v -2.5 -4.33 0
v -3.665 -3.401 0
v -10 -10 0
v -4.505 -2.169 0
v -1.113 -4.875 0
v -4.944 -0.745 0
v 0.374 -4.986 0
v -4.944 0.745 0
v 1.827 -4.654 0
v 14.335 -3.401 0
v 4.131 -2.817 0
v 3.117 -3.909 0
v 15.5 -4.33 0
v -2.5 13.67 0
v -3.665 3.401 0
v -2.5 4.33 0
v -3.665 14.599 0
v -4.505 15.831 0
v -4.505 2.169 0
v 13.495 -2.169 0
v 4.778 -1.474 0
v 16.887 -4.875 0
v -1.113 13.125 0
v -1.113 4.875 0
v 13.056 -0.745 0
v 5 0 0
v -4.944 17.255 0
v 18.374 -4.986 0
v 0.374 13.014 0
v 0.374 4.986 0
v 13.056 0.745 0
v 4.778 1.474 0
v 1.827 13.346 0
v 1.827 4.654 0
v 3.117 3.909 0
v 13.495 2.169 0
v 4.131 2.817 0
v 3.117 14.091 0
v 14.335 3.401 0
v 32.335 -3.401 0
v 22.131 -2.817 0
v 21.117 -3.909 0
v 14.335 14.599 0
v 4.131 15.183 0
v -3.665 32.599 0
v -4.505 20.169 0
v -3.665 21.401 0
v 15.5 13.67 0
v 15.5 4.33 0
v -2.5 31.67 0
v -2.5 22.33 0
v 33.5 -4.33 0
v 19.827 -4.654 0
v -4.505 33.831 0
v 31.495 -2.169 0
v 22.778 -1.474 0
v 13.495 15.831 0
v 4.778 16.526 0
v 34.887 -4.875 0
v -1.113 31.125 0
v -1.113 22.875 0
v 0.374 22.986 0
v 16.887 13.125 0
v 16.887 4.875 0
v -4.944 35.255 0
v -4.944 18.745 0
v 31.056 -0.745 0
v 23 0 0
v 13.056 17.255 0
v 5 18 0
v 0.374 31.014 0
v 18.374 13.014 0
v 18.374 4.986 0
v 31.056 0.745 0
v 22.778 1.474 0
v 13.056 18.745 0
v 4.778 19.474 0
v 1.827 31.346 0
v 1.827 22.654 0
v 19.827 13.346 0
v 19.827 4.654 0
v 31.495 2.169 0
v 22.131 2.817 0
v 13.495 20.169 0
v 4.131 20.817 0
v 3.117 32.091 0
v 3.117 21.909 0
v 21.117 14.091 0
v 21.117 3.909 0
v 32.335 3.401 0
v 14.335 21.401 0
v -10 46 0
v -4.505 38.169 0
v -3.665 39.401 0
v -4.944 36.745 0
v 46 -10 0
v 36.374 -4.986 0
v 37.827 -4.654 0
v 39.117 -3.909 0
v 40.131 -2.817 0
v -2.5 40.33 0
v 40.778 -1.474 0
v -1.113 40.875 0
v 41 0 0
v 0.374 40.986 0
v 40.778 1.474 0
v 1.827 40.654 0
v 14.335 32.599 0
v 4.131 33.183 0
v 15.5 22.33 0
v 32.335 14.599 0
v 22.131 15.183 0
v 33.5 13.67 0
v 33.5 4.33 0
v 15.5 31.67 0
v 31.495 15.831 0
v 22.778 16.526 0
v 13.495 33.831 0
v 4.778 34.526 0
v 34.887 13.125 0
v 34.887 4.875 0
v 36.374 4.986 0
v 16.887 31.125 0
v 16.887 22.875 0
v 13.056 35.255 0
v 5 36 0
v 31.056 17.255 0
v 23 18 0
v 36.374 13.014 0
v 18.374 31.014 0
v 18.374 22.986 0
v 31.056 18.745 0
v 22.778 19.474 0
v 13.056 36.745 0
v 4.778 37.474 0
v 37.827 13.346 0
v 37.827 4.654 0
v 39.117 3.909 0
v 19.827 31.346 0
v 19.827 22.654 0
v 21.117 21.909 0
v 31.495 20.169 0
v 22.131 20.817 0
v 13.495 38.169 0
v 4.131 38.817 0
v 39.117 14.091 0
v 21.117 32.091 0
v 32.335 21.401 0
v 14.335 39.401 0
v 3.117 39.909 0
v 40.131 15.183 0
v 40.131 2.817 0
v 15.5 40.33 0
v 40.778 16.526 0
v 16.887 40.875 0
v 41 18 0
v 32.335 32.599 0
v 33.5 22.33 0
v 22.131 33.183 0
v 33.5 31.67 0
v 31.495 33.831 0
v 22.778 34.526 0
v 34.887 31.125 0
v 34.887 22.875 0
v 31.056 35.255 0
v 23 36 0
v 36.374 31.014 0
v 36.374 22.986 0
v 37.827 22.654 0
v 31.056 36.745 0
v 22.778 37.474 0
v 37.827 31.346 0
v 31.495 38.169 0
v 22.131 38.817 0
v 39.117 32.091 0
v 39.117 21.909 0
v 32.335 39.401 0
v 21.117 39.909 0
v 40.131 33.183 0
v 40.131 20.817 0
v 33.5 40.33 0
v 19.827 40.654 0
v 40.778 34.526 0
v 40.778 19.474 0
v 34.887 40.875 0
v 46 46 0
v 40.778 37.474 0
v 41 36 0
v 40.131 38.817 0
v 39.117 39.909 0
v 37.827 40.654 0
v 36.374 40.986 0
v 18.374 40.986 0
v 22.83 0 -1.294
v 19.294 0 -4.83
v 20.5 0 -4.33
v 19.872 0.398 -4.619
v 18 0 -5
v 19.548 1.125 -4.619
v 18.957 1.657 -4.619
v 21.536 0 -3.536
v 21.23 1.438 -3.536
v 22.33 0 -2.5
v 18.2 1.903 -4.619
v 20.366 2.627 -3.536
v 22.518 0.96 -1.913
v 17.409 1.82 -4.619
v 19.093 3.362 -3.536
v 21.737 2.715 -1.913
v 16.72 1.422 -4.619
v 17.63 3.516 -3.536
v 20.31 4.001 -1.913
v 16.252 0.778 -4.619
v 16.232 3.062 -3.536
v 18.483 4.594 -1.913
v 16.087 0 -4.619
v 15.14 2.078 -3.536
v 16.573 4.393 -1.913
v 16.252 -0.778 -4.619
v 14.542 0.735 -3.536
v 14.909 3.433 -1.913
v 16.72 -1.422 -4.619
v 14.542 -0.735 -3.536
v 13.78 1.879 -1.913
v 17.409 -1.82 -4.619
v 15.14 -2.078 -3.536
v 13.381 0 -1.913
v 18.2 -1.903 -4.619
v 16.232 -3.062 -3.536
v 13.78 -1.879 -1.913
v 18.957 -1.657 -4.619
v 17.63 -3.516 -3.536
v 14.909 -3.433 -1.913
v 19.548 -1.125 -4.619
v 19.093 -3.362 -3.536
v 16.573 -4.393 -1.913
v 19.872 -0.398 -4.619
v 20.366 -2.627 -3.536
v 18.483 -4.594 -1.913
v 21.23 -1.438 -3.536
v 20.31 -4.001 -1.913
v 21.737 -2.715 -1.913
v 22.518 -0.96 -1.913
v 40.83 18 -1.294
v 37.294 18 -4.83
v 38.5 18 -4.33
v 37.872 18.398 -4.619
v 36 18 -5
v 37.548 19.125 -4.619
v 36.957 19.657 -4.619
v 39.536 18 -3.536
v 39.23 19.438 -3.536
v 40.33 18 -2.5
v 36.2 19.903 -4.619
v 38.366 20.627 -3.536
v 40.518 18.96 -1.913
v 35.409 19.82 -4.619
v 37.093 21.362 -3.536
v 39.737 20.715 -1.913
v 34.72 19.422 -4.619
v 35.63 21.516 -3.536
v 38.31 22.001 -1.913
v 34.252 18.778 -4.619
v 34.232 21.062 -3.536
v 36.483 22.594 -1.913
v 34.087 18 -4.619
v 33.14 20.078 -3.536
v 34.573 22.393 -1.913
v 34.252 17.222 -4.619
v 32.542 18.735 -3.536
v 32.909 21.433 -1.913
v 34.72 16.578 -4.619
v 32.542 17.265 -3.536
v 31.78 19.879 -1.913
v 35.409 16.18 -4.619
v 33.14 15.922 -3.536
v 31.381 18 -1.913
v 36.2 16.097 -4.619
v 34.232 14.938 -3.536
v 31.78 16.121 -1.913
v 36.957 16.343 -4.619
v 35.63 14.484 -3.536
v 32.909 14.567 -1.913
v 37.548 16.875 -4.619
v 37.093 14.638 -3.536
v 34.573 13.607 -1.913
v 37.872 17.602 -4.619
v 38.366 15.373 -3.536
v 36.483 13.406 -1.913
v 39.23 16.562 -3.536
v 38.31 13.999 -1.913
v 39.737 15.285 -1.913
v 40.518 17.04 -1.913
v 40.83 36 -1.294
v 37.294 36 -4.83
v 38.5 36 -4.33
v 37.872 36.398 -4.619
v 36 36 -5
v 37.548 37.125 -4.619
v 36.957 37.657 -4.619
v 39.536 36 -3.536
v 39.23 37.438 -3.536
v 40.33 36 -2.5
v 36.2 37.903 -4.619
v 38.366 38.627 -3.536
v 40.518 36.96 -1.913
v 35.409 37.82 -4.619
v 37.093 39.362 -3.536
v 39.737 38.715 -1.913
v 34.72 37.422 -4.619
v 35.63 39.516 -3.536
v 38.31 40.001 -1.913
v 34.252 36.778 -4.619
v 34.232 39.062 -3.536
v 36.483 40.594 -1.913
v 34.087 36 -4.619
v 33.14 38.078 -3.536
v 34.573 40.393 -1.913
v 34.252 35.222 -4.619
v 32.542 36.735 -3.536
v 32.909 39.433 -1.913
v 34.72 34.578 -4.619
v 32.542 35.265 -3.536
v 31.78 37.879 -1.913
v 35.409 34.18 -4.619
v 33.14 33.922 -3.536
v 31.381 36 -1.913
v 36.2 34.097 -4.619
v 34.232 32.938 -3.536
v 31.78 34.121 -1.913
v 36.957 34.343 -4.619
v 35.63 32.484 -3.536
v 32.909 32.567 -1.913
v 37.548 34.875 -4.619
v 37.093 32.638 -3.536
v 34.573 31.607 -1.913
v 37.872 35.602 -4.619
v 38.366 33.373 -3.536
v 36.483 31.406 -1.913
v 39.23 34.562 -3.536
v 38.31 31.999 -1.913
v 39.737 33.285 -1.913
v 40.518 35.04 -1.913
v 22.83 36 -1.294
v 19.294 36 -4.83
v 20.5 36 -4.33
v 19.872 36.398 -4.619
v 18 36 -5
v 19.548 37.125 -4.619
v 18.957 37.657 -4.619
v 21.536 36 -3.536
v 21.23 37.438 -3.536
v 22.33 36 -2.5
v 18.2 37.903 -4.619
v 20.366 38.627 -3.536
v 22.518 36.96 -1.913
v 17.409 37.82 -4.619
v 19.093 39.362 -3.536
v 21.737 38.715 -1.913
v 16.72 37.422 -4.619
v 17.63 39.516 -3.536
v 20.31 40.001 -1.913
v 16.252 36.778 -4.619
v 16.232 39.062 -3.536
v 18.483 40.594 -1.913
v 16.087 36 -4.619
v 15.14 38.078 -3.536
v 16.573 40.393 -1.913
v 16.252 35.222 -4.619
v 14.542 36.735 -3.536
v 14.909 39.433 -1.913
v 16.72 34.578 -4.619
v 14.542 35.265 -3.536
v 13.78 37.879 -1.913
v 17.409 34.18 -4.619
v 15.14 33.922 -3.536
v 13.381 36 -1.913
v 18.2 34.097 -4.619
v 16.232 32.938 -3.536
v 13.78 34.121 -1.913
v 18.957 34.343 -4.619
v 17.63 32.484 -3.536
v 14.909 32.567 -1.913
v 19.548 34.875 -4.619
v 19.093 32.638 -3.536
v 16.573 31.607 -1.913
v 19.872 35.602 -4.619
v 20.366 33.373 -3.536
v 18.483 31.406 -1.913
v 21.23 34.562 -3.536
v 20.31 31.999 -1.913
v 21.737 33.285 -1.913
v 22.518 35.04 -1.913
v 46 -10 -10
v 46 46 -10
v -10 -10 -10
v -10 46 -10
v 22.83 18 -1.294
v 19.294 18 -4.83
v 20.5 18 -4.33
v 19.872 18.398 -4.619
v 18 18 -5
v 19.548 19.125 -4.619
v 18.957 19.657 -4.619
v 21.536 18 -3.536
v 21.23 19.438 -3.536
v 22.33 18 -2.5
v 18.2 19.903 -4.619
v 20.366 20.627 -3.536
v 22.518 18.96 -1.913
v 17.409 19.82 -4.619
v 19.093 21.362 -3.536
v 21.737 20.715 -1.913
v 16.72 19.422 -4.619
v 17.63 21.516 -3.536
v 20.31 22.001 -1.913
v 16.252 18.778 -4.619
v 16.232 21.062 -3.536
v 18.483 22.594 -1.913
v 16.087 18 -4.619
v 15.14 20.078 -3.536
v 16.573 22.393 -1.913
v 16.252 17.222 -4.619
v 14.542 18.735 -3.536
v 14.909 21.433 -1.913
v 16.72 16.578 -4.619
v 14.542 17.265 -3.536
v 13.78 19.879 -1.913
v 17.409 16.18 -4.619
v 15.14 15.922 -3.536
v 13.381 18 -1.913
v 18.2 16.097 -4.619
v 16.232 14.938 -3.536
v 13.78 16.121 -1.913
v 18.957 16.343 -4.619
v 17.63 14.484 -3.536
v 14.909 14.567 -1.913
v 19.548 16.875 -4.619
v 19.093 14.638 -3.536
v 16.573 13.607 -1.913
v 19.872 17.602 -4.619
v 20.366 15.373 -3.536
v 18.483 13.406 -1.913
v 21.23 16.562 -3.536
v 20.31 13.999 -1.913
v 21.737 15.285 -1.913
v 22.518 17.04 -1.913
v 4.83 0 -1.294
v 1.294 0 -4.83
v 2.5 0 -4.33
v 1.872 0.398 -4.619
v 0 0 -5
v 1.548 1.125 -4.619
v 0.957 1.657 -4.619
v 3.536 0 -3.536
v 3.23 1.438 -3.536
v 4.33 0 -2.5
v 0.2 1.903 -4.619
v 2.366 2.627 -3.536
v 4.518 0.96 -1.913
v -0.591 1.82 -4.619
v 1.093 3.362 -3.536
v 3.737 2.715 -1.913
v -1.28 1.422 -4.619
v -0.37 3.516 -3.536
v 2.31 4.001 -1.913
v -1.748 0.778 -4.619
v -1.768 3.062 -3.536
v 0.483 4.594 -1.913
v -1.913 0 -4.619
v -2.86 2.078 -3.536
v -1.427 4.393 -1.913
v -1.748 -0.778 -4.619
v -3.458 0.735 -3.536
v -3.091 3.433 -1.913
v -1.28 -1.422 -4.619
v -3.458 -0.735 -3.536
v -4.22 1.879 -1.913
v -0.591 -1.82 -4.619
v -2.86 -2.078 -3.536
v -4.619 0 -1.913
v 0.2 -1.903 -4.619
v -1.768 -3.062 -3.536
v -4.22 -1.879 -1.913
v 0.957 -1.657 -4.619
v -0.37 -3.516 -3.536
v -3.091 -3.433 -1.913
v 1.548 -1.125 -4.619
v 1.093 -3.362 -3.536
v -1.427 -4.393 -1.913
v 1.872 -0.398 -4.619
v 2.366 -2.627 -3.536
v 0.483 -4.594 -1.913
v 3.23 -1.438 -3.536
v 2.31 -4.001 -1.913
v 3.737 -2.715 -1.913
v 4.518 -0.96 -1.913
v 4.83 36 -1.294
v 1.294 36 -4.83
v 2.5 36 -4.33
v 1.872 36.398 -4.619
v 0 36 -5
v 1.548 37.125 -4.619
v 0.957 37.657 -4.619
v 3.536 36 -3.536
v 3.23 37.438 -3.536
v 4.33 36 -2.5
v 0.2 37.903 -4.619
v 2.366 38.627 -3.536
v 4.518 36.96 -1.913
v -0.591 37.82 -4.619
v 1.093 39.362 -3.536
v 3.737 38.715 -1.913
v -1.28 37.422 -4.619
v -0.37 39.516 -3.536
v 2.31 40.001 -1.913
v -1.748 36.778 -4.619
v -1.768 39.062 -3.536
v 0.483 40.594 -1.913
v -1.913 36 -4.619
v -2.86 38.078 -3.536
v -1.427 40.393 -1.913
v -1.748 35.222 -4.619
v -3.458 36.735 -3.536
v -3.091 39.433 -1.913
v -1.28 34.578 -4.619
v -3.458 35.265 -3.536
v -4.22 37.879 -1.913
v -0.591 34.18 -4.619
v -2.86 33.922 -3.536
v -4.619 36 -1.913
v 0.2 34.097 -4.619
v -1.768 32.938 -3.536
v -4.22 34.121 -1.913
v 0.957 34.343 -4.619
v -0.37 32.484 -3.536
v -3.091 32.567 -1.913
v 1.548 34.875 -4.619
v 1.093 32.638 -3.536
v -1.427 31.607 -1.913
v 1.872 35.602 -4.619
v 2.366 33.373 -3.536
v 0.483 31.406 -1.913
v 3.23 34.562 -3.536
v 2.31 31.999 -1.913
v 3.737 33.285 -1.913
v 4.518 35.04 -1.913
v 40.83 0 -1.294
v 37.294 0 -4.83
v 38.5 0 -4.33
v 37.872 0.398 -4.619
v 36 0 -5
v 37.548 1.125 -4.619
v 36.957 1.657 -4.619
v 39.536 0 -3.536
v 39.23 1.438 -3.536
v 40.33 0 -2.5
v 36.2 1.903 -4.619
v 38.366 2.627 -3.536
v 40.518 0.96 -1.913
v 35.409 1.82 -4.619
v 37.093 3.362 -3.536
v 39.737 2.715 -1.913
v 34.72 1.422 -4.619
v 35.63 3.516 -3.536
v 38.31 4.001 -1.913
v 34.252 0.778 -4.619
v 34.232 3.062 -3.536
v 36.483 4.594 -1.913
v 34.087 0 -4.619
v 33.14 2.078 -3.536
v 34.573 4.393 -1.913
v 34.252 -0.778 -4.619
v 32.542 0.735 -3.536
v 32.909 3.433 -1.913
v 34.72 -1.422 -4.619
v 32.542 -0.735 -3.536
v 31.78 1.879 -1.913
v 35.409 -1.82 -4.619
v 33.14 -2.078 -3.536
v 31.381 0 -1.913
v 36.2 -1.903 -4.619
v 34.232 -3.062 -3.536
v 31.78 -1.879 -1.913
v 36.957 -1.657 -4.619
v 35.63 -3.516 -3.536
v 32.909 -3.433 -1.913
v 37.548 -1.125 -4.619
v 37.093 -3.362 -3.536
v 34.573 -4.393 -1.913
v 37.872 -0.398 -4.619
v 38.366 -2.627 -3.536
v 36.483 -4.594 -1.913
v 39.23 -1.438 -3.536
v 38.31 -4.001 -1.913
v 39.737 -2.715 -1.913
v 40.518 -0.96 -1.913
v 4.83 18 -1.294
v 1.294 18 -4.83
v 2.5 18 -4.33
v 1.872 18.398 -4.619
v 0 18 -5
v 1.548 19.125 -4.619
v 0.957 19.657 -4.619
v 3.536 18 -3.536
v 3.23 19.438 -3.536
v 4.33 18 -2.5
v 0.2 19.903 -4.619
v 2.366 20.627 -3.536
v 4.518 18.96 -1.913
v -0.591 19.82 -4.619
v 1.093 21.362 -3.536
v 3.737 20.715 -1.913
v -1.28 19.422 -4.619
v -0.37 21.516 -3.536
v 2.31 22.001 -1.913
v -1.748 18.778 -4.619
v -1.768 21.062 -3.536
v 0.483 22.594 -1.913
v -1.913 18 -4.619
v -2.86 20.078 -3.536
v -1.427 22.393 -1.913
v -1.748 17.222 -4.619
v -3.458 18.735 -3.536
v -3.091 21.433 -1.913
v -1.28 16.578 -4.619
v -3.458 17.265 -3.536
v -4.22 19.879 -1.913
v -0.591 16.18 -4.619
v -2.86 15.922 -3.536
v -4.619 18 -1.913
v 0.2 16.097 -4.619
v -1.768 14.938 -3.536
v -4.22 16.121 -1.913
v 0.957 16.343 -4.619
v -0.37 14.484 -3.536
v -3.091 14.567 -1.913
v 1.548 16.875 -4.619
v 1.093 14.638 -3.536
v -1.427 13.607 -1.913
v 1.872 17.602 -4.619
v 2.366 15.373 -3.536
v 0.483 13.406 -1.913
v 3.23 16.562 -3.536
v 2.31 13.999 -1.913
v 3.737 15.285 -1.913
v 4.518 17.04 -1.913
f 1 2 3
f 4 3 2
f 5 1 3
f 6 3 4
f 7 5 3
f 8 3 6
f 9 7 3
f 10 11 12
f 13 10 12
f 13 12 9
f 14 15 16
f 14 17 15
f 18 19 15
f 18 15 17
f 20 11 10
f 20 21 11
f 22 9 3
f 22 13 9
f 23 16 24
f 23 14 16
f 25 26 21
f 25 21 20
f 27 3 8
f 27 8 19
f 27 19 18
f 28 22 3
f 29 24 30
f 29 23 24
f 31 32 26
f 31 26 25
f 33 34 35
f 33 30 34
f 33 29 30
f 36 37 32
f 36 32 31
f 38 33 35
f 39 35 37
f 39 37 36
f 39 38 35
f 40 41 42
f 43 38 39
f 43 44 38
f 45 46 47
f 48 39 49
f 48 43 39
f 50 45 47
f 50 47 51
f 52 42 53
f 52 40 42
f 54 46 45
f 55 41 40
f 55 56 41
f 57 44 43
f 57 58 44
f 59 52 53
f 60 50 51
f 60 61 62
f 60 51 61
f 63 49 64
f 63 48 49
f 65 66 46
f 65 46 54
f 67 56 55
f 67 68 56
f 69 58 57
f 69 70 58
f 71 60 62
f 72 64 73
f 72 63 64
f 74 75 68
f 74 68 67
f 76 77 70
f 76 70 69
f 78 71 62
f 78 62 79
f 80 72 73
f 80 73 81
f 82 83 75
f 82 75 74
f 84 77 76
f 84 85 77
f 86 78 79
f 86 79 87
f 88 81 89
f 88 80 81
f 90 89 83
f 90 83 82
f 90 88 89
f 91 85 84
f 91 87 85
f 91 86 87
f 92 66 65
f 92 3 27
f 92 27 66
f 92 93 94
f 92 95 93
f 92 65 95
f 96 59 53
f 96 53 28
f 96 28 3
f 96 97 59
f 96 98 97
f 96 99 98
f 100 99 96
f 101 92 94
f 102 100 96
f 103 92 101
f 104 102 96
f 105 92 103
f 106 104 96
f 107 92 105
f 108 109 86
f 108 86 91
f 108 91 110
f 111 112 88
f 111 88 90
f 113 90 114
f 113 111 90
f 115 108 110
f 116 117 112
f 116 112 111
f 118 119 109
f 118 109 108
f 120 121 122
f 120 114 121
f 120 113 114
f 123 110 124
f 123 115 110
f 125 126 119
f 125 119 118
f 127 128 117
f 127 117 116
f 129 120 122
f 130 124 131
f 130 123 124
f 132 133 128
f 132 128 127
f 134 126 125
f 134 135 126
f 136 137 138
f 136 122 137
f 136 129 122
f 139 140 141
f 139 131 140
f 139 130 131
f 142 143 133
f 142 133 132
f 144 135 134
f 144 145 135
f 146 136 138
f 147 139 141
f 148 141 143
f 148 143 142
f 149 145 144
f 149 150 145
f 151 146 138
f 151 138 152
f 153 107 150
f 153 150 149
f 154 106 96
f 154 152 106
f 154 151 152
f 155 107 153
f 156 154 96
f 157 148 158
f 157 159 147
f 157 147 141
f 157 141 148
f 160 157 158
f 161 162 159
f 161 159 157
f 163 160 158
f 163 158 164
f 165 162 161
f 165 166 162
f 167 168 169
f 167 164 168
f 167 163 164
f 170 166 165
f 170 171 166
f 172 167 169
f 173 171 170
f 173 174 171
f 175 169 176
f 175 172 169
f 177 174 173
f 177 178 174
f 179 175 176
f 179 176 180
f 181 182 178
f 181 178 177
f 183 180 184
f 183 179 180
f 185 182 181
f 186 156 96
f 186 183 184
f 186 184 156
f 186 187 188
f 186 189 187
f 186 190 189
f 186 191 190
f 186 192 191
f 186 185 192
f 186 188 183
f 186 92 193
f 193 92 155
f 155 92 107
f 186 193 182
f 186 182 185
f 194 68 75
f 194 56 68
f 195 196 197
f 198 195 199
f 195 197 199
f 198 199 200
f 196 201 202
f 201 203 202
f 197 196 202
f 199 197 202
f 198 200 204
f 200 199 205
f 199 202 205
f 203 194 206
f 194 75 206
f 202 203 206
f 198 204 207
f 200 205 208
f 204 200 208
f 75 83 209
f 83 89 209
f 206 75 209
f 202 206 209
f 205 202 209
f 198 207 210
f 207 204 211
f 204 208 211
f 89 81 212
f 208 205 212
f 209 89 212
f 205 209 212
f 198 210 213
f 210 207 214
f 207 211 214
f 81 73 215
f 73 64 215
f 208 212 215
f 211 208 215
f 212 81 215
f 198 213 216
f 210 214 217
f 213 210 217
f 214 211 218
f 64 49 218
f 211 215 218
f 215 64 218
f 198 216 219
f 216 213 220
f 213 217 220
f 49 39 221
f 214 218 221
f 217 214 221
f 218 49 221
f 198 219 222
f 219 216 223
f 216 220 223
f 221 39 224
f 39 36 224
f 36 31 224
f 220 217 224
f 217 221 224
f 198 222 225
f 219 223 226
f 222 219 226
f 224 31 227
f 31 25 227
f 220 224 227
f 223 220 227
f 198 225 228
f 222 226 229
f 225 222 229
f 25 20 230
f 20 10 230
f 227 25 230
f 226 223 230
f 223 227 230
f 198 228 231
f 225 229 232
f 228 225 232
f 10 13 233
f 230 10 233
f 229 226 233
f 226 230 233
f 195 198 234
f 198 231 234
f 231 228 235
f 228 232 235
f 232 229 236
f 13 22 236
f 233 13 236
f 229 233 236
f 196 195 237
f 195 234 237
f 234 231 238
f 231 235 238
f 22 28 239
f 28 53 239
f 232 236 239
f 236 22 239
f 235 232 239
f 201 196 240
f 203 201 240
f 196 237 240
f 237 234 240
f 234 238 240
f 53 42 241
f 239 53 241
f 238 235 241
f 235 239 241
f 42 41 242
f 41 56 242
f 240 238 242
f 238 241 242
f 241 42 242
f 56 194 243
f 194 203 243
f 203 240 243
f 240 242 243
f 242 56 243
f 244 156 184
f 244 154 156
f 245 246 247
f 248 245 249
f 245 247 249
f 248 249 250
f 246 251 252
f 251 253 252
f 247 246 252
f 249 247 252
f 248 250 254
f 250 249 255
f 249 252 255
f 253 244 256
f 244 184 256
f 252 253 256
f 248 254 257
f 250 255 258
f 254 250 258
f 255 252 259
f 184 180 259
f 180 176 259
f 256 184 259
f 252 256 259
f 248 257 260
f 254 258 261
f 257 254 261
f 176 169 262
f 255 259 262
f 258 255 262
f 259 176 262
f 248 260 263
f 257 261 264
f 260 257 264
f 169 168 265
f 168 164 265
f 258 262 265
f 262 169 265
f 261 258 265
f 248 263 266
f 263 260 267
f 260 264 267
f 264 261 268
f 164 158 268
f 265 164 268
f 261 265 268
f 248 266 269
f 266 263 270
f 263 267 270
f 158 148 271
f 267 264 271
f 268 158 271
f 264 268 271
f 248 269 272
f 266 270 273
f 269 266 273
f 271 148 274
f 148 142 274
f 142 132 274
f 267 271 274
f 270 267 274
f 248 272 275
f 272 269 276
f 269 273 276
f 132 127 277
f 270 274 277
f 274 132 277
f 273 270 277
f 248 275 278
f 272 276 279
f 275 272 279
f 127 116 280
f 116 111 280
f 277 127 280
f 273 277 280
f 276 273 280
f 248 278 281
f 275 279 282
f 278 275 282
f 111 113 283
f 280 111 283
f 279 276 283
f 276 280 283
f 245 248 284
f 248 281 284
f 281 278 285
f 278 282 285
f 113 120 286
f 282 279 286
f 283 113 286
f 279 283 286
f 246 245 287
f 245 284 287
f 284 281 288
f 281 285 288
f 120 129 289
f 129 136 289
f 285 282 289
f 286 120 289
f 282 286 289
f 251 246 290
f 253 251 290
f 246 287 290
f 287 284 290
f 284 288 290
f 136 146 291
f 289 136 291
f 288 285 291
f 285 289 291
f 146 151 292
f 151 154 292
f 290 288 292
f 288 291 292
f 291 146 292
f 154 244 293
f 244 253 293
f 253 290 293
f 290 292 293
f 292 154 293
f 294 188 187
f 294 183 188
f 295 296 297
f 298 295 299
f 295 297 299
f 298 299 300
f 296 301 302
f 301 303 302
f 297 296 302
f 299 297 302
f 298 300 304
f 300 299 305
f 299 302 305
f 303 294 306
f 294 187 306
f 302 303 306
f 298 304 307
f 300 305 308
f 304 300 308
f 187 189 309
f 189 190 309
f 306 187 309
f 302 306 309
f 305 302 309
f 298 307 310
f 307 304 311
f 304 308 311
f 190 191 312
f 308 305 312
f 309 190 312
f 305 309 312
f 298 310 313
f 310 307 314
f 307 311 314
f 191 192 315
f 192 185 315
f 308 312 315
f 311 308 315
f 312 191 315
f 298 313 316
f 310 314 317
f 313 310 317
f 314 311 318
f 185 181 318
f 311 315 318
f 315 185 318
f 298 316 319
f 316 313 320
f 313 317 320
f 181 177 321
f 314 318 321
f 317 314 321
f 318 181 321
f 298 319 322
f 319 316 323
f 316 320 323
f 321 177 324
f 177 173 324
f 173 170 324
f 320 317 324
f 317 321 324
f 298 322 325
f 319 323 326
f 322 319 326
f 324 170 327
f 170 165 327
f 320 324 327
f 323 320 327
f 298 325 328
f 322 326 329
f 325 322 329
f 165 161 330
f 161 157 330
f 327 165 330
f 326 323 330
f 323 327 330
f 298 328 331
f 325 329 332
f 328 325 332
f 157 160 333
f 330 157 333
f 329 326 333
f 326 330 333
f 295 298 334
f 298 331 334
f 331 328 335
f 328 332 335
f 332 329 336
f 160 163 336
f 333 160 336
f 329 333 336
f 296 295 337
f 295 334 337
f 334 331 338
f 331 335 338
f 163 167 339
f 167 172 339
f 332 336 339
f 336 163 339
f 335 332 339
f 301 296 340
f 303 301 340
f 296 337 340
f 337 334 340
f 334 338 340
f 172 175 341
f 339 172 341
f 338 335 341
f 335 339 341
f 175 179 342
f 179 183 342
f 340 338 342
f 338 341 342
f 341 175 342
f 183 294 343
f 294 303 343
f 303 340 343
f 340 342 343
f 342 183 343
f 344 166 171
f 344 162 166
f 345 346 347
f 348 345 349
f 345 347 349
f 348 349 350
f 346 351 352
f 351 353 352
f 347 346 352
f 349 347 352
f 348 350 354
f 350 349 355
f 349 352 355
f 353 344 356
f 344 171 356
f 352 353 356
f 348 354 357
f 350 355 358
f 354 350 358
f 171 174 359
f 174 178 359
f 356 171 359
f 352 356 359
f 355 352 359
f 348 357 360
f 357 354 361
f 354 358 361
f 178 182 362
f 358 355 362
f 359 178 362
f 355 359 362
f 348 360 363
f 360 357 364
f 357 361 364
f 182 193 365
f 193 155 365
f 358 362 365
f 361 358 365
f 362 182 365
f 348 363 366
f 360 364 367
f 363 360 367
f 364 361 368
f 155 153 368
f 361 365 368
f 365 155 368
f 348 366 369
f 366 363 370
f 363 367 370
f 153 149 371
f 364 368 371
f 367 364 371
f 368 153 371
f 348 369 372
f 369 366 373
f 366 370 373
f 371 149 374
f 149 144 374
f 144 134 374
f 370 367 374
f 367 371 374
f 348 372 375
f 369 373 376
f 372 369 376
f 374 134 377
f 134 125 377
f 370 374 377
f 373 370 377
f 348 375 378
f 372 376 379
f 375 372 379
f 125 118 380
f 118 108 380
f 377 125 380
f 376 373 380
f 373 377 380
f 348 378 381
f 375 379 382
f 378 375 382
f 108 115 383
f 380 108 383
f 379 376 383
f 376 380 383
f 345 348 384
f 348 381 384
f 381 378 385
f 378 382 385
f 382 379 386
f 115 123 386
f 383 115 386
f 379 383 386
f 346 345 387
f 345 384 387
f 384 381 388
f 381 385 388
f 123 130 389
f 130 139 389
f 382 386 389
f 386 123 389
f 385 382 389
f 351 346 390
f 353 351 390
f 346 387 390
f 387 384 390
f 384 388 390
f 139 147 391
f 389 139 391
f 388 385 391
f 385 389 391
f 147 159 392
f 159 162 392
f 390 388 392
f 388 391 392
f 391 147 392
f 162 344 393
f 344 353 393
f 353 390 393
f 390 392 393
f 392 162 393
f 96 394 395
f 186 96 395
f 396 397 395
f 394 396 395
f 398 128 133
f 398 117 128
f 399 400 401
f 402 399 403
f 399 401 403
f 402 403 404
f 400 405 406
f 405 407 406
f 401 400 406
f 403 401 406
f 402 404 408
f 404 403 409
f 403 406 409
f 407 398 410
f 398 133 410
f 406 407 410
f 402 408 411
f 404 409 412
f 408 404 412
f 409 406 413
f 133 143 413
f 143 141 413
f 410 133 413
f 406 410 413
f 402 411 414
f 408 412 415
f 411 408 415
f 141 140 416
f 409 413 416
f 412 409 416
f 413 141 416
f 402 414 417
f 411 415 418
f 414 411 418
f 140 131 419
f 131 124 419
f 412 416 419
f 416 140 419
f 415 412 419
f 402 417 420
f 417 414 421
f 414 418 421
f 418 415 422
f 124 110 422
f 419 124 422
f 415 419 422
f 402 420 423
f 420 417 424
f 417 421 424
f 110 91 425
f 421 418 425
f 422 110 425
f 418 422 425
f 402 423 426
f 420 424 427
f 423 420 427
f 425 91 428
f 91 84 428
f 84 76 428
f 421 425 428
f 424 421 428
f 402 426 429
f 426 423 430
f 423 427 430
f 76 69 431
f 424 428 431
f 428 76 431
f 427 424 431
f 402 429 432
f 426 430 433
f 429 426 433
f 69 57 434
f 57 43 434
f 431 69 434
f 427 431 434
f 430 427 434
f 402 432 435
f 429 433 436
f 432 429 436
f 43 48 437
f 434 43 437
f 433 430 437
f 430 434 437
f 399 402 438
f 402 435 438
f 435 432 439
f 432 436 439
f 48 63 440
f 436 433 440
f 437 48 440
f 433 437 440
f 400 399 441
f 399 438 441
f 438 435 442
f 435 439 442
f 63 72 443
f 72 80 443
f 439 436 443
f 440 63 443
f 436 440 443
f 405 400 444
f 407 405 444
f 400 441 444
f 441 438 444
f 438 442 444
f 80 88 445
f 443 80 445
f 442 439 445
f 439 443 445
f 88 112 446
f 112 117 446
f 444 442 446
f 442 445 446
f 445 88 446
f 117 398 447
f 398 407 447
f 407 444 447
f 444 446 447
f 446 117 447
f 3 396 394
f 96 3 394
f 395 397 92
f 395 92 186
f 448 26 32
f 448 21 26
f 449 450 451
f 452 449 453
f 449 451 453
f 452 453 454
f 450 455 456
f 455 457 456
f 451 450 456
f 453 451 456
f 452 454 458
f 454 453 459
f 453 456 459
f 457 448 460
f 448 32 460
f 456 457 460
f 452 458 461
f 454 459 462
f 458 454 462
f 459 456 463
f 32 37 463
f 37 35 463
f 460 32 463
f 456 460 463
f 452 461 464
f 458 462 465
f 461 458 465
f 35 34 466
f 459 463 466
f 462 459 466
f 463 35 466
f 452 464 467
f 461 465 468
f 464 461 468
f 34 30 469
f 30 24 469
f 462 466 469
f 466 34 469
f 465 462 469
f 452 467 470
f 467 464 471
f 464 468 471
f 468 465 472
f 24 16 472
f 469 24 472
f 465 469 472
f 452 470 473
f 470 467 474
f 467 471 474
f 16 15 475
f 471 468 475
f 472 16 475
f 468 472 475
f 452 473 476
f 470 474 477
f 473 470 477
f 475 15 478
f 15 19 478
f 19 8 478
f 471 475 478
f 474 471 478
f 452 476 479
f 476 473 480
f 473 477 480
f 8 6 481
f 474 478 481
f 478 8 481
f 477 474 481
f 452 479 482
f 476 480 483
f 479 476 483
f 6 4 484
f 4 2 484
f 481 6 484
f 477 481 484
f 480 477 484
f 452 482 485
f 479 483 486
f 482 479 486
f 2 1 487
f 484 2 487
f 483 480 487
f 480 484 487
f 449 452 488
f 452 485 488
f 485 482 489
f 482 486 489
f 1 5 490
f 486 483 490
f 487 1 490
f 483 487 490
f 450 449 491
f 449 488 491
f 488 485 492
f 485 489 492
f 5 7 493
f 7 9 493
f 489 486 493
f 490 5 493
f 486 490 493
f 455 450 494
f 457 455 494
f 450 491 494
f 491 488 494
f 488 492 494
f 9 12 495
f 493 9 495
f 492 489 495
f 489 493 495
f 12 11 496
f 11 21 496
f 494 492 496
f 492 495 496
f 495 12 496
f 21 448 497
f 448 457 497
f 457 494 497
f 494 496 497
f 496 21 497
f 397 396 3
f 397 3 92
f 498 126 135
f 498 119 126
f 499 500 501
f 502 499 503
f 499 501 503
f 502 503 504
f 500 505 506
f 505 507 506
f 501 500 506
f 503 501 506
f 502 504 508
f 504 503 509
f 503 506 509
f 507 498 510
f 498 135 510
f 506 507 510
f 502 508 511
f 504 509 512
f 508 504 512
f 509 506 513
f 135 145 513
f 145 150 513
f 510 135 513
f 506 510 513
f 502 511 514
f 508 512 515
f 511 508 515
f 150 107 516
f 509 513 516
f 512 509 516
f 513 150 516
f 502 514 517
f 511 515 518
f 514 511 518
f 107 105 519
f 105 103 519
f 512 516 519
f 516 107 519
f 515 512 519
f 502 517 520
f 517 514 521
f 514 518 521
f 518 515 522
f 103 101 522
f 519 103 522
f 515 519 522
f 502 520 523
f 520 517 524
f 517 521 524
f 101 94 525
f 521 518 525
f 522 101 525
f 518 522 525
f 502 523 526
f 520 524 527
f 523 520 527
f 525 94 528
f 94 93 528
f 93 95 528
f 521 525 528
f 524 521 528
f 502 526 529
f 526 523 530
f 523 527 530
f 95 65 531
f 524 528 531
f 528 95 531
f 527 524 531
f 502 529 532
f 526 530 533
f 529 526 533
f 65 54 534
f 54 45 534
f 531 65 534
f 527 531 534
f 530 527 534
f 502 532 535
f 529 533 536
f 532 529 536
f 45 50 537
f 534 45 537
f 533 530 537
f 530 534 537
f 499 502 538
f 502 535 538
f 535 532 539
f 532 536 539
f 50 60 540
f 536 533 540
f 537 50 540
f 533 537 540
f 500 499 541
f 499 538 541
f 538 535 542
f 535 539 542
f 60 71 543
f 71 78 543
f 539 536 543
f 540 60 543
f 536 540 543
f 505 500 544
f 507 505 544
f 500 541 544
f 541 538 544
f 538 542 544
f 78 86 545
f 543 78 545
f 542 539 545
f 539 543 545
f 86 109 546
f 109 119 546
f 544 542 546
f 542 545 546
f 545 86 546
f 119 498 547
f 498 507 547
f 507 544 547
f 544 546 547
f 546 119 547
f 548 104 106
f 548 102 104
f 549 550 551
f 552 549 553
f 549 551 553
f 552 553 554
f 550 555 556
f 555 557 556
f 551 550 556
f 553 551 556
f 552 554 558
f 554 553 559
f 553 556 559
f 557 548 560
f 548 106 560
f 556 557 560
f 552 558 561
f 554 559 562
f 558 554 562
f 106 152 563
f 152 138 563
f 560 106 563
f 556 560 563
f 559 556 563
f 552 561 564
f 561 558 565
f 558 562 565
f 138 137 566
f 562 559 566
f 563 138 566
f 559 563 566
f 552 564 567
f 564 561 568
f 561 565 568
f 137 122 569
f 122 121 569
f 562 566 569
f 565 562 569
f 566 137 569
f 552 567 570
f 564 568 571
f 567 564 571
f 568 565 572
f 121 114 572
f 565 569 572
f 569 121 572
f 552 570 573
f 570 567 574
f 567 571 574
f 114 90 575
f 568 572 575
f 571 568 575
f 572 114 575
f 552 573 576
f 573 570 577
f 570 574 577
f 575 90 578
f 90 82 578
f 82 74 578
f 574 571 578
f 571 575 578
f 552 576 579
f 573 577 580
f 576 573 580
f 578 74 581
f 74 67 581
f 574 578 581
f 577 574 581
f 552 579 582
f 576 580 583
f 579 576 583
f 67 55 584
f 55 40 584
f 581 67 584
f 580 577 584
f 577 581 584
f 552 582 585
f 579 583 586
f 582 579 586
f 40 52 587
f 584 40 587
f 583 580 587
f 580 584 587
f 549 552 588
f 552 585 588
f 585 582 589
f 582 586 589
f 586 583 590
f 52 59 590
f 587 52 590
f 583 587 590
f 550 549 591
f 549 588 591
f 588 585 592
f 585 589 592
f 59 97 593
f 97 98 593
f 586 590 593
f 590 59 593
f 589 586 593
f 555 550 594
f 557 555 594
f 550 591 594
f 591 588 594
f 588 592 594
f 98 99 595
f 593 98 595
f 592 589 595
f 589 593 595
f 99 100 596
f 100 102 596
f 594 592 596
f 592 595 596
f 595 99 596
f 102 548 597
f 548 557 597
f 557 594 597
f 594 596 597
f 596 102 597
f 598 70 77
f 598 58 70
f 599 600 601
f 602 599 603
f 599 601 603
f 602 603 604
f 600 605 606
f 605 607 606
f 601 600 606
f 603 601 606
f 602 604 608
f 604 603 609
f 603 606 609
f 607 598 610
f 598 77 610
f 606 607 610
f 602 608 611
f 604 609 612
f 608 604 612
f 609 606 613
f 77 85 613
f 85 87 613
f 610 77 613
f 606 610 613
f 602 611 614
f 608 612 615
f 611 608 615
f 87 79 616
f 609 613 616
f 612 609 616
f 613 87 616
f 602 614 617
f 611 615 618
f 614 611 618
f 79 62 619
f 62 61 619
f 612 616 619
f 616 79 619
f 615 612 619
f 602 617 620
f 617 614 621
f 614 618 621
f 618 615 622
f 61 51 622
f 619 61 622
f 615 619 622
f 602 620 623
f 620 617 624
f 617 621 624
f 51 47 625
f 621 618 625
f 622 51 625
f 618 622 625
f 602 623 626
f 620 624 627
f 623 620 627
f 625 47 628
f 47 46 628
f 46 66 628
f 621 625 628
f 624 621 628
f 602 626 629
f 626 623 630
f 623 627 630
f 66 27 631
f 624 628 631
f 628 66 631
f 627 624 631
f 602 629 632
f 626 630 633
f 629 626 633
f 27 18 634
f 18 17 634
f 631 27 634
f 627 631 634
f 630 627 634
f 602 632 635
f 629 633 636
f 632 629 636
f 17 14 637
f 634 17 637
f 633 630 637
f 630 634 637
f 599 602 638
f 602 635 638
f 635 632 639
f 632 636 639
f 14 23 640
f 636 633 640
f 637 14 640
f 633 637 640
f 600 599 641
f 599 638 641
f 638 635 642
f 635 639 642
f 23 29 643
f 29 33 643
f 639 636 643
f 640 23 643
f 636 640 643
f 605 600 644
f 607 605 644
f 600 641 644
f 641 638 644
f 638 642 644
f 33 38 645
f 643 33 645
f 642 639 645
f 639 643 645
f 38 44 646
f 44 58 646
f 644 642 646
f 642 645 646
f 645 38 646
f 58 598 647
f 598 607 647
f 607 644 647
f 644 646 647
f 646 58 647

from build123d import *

# Parameters (mm, degrees)
ARRAY_X_COUNT = 3
ARRAY_X_PITCH = 18
ARRAY_Y_COUNT = 3
ARRAY_Y_PITCH = 18
BOX_W         = 56
BOX_H         = 56
BOX_DEPTH     = 10


with BuildPart() as array:
    # Sphere → Sphere (revolve)
    with BuildSketch(Plane.XZ):
        with BuildLine():
            ThreePointArc((0, -5), (5, 0), (0, 5))
            Line((0, 5), (0, -5))
        make_face()
    revolve(axis=Axis((0, 0, 0), (0, 0, 1)))

    # Array X: Array ×3


with BuildPart() as array_1:
    add(array.part)
    with Locations(*[(i * ARRAY_X_PITCH, 0, 0) for i in range(1, ARRAY_X_COUNT)]):
        add(array.part)

    # Array Y: Array ×3


with BuildPart() as array_2:
    add(array_1.part)
    with Locations(*[(0, i * ARRAY_Y_PITCH, 0) for i in range(1, ARRAY_Y_COUNT)]):
        add(array_1.part)


with BuildPart() as cut:
    # Box → Box (new body)
    with BuildSketch(Plane(origin=(-10, -10, -10), x_dir=(1, 0, 0), z_dir=(0, 0, 1))):
        with Locations((28, 28)):
            Rectangle(BOX_W, BOX_H)
    extrude(amount=BOX_DEPTH)

    # Cut: cut Array
    add(array_2.part, mode=Mode.SUBTRACT)


solid = cut.part
